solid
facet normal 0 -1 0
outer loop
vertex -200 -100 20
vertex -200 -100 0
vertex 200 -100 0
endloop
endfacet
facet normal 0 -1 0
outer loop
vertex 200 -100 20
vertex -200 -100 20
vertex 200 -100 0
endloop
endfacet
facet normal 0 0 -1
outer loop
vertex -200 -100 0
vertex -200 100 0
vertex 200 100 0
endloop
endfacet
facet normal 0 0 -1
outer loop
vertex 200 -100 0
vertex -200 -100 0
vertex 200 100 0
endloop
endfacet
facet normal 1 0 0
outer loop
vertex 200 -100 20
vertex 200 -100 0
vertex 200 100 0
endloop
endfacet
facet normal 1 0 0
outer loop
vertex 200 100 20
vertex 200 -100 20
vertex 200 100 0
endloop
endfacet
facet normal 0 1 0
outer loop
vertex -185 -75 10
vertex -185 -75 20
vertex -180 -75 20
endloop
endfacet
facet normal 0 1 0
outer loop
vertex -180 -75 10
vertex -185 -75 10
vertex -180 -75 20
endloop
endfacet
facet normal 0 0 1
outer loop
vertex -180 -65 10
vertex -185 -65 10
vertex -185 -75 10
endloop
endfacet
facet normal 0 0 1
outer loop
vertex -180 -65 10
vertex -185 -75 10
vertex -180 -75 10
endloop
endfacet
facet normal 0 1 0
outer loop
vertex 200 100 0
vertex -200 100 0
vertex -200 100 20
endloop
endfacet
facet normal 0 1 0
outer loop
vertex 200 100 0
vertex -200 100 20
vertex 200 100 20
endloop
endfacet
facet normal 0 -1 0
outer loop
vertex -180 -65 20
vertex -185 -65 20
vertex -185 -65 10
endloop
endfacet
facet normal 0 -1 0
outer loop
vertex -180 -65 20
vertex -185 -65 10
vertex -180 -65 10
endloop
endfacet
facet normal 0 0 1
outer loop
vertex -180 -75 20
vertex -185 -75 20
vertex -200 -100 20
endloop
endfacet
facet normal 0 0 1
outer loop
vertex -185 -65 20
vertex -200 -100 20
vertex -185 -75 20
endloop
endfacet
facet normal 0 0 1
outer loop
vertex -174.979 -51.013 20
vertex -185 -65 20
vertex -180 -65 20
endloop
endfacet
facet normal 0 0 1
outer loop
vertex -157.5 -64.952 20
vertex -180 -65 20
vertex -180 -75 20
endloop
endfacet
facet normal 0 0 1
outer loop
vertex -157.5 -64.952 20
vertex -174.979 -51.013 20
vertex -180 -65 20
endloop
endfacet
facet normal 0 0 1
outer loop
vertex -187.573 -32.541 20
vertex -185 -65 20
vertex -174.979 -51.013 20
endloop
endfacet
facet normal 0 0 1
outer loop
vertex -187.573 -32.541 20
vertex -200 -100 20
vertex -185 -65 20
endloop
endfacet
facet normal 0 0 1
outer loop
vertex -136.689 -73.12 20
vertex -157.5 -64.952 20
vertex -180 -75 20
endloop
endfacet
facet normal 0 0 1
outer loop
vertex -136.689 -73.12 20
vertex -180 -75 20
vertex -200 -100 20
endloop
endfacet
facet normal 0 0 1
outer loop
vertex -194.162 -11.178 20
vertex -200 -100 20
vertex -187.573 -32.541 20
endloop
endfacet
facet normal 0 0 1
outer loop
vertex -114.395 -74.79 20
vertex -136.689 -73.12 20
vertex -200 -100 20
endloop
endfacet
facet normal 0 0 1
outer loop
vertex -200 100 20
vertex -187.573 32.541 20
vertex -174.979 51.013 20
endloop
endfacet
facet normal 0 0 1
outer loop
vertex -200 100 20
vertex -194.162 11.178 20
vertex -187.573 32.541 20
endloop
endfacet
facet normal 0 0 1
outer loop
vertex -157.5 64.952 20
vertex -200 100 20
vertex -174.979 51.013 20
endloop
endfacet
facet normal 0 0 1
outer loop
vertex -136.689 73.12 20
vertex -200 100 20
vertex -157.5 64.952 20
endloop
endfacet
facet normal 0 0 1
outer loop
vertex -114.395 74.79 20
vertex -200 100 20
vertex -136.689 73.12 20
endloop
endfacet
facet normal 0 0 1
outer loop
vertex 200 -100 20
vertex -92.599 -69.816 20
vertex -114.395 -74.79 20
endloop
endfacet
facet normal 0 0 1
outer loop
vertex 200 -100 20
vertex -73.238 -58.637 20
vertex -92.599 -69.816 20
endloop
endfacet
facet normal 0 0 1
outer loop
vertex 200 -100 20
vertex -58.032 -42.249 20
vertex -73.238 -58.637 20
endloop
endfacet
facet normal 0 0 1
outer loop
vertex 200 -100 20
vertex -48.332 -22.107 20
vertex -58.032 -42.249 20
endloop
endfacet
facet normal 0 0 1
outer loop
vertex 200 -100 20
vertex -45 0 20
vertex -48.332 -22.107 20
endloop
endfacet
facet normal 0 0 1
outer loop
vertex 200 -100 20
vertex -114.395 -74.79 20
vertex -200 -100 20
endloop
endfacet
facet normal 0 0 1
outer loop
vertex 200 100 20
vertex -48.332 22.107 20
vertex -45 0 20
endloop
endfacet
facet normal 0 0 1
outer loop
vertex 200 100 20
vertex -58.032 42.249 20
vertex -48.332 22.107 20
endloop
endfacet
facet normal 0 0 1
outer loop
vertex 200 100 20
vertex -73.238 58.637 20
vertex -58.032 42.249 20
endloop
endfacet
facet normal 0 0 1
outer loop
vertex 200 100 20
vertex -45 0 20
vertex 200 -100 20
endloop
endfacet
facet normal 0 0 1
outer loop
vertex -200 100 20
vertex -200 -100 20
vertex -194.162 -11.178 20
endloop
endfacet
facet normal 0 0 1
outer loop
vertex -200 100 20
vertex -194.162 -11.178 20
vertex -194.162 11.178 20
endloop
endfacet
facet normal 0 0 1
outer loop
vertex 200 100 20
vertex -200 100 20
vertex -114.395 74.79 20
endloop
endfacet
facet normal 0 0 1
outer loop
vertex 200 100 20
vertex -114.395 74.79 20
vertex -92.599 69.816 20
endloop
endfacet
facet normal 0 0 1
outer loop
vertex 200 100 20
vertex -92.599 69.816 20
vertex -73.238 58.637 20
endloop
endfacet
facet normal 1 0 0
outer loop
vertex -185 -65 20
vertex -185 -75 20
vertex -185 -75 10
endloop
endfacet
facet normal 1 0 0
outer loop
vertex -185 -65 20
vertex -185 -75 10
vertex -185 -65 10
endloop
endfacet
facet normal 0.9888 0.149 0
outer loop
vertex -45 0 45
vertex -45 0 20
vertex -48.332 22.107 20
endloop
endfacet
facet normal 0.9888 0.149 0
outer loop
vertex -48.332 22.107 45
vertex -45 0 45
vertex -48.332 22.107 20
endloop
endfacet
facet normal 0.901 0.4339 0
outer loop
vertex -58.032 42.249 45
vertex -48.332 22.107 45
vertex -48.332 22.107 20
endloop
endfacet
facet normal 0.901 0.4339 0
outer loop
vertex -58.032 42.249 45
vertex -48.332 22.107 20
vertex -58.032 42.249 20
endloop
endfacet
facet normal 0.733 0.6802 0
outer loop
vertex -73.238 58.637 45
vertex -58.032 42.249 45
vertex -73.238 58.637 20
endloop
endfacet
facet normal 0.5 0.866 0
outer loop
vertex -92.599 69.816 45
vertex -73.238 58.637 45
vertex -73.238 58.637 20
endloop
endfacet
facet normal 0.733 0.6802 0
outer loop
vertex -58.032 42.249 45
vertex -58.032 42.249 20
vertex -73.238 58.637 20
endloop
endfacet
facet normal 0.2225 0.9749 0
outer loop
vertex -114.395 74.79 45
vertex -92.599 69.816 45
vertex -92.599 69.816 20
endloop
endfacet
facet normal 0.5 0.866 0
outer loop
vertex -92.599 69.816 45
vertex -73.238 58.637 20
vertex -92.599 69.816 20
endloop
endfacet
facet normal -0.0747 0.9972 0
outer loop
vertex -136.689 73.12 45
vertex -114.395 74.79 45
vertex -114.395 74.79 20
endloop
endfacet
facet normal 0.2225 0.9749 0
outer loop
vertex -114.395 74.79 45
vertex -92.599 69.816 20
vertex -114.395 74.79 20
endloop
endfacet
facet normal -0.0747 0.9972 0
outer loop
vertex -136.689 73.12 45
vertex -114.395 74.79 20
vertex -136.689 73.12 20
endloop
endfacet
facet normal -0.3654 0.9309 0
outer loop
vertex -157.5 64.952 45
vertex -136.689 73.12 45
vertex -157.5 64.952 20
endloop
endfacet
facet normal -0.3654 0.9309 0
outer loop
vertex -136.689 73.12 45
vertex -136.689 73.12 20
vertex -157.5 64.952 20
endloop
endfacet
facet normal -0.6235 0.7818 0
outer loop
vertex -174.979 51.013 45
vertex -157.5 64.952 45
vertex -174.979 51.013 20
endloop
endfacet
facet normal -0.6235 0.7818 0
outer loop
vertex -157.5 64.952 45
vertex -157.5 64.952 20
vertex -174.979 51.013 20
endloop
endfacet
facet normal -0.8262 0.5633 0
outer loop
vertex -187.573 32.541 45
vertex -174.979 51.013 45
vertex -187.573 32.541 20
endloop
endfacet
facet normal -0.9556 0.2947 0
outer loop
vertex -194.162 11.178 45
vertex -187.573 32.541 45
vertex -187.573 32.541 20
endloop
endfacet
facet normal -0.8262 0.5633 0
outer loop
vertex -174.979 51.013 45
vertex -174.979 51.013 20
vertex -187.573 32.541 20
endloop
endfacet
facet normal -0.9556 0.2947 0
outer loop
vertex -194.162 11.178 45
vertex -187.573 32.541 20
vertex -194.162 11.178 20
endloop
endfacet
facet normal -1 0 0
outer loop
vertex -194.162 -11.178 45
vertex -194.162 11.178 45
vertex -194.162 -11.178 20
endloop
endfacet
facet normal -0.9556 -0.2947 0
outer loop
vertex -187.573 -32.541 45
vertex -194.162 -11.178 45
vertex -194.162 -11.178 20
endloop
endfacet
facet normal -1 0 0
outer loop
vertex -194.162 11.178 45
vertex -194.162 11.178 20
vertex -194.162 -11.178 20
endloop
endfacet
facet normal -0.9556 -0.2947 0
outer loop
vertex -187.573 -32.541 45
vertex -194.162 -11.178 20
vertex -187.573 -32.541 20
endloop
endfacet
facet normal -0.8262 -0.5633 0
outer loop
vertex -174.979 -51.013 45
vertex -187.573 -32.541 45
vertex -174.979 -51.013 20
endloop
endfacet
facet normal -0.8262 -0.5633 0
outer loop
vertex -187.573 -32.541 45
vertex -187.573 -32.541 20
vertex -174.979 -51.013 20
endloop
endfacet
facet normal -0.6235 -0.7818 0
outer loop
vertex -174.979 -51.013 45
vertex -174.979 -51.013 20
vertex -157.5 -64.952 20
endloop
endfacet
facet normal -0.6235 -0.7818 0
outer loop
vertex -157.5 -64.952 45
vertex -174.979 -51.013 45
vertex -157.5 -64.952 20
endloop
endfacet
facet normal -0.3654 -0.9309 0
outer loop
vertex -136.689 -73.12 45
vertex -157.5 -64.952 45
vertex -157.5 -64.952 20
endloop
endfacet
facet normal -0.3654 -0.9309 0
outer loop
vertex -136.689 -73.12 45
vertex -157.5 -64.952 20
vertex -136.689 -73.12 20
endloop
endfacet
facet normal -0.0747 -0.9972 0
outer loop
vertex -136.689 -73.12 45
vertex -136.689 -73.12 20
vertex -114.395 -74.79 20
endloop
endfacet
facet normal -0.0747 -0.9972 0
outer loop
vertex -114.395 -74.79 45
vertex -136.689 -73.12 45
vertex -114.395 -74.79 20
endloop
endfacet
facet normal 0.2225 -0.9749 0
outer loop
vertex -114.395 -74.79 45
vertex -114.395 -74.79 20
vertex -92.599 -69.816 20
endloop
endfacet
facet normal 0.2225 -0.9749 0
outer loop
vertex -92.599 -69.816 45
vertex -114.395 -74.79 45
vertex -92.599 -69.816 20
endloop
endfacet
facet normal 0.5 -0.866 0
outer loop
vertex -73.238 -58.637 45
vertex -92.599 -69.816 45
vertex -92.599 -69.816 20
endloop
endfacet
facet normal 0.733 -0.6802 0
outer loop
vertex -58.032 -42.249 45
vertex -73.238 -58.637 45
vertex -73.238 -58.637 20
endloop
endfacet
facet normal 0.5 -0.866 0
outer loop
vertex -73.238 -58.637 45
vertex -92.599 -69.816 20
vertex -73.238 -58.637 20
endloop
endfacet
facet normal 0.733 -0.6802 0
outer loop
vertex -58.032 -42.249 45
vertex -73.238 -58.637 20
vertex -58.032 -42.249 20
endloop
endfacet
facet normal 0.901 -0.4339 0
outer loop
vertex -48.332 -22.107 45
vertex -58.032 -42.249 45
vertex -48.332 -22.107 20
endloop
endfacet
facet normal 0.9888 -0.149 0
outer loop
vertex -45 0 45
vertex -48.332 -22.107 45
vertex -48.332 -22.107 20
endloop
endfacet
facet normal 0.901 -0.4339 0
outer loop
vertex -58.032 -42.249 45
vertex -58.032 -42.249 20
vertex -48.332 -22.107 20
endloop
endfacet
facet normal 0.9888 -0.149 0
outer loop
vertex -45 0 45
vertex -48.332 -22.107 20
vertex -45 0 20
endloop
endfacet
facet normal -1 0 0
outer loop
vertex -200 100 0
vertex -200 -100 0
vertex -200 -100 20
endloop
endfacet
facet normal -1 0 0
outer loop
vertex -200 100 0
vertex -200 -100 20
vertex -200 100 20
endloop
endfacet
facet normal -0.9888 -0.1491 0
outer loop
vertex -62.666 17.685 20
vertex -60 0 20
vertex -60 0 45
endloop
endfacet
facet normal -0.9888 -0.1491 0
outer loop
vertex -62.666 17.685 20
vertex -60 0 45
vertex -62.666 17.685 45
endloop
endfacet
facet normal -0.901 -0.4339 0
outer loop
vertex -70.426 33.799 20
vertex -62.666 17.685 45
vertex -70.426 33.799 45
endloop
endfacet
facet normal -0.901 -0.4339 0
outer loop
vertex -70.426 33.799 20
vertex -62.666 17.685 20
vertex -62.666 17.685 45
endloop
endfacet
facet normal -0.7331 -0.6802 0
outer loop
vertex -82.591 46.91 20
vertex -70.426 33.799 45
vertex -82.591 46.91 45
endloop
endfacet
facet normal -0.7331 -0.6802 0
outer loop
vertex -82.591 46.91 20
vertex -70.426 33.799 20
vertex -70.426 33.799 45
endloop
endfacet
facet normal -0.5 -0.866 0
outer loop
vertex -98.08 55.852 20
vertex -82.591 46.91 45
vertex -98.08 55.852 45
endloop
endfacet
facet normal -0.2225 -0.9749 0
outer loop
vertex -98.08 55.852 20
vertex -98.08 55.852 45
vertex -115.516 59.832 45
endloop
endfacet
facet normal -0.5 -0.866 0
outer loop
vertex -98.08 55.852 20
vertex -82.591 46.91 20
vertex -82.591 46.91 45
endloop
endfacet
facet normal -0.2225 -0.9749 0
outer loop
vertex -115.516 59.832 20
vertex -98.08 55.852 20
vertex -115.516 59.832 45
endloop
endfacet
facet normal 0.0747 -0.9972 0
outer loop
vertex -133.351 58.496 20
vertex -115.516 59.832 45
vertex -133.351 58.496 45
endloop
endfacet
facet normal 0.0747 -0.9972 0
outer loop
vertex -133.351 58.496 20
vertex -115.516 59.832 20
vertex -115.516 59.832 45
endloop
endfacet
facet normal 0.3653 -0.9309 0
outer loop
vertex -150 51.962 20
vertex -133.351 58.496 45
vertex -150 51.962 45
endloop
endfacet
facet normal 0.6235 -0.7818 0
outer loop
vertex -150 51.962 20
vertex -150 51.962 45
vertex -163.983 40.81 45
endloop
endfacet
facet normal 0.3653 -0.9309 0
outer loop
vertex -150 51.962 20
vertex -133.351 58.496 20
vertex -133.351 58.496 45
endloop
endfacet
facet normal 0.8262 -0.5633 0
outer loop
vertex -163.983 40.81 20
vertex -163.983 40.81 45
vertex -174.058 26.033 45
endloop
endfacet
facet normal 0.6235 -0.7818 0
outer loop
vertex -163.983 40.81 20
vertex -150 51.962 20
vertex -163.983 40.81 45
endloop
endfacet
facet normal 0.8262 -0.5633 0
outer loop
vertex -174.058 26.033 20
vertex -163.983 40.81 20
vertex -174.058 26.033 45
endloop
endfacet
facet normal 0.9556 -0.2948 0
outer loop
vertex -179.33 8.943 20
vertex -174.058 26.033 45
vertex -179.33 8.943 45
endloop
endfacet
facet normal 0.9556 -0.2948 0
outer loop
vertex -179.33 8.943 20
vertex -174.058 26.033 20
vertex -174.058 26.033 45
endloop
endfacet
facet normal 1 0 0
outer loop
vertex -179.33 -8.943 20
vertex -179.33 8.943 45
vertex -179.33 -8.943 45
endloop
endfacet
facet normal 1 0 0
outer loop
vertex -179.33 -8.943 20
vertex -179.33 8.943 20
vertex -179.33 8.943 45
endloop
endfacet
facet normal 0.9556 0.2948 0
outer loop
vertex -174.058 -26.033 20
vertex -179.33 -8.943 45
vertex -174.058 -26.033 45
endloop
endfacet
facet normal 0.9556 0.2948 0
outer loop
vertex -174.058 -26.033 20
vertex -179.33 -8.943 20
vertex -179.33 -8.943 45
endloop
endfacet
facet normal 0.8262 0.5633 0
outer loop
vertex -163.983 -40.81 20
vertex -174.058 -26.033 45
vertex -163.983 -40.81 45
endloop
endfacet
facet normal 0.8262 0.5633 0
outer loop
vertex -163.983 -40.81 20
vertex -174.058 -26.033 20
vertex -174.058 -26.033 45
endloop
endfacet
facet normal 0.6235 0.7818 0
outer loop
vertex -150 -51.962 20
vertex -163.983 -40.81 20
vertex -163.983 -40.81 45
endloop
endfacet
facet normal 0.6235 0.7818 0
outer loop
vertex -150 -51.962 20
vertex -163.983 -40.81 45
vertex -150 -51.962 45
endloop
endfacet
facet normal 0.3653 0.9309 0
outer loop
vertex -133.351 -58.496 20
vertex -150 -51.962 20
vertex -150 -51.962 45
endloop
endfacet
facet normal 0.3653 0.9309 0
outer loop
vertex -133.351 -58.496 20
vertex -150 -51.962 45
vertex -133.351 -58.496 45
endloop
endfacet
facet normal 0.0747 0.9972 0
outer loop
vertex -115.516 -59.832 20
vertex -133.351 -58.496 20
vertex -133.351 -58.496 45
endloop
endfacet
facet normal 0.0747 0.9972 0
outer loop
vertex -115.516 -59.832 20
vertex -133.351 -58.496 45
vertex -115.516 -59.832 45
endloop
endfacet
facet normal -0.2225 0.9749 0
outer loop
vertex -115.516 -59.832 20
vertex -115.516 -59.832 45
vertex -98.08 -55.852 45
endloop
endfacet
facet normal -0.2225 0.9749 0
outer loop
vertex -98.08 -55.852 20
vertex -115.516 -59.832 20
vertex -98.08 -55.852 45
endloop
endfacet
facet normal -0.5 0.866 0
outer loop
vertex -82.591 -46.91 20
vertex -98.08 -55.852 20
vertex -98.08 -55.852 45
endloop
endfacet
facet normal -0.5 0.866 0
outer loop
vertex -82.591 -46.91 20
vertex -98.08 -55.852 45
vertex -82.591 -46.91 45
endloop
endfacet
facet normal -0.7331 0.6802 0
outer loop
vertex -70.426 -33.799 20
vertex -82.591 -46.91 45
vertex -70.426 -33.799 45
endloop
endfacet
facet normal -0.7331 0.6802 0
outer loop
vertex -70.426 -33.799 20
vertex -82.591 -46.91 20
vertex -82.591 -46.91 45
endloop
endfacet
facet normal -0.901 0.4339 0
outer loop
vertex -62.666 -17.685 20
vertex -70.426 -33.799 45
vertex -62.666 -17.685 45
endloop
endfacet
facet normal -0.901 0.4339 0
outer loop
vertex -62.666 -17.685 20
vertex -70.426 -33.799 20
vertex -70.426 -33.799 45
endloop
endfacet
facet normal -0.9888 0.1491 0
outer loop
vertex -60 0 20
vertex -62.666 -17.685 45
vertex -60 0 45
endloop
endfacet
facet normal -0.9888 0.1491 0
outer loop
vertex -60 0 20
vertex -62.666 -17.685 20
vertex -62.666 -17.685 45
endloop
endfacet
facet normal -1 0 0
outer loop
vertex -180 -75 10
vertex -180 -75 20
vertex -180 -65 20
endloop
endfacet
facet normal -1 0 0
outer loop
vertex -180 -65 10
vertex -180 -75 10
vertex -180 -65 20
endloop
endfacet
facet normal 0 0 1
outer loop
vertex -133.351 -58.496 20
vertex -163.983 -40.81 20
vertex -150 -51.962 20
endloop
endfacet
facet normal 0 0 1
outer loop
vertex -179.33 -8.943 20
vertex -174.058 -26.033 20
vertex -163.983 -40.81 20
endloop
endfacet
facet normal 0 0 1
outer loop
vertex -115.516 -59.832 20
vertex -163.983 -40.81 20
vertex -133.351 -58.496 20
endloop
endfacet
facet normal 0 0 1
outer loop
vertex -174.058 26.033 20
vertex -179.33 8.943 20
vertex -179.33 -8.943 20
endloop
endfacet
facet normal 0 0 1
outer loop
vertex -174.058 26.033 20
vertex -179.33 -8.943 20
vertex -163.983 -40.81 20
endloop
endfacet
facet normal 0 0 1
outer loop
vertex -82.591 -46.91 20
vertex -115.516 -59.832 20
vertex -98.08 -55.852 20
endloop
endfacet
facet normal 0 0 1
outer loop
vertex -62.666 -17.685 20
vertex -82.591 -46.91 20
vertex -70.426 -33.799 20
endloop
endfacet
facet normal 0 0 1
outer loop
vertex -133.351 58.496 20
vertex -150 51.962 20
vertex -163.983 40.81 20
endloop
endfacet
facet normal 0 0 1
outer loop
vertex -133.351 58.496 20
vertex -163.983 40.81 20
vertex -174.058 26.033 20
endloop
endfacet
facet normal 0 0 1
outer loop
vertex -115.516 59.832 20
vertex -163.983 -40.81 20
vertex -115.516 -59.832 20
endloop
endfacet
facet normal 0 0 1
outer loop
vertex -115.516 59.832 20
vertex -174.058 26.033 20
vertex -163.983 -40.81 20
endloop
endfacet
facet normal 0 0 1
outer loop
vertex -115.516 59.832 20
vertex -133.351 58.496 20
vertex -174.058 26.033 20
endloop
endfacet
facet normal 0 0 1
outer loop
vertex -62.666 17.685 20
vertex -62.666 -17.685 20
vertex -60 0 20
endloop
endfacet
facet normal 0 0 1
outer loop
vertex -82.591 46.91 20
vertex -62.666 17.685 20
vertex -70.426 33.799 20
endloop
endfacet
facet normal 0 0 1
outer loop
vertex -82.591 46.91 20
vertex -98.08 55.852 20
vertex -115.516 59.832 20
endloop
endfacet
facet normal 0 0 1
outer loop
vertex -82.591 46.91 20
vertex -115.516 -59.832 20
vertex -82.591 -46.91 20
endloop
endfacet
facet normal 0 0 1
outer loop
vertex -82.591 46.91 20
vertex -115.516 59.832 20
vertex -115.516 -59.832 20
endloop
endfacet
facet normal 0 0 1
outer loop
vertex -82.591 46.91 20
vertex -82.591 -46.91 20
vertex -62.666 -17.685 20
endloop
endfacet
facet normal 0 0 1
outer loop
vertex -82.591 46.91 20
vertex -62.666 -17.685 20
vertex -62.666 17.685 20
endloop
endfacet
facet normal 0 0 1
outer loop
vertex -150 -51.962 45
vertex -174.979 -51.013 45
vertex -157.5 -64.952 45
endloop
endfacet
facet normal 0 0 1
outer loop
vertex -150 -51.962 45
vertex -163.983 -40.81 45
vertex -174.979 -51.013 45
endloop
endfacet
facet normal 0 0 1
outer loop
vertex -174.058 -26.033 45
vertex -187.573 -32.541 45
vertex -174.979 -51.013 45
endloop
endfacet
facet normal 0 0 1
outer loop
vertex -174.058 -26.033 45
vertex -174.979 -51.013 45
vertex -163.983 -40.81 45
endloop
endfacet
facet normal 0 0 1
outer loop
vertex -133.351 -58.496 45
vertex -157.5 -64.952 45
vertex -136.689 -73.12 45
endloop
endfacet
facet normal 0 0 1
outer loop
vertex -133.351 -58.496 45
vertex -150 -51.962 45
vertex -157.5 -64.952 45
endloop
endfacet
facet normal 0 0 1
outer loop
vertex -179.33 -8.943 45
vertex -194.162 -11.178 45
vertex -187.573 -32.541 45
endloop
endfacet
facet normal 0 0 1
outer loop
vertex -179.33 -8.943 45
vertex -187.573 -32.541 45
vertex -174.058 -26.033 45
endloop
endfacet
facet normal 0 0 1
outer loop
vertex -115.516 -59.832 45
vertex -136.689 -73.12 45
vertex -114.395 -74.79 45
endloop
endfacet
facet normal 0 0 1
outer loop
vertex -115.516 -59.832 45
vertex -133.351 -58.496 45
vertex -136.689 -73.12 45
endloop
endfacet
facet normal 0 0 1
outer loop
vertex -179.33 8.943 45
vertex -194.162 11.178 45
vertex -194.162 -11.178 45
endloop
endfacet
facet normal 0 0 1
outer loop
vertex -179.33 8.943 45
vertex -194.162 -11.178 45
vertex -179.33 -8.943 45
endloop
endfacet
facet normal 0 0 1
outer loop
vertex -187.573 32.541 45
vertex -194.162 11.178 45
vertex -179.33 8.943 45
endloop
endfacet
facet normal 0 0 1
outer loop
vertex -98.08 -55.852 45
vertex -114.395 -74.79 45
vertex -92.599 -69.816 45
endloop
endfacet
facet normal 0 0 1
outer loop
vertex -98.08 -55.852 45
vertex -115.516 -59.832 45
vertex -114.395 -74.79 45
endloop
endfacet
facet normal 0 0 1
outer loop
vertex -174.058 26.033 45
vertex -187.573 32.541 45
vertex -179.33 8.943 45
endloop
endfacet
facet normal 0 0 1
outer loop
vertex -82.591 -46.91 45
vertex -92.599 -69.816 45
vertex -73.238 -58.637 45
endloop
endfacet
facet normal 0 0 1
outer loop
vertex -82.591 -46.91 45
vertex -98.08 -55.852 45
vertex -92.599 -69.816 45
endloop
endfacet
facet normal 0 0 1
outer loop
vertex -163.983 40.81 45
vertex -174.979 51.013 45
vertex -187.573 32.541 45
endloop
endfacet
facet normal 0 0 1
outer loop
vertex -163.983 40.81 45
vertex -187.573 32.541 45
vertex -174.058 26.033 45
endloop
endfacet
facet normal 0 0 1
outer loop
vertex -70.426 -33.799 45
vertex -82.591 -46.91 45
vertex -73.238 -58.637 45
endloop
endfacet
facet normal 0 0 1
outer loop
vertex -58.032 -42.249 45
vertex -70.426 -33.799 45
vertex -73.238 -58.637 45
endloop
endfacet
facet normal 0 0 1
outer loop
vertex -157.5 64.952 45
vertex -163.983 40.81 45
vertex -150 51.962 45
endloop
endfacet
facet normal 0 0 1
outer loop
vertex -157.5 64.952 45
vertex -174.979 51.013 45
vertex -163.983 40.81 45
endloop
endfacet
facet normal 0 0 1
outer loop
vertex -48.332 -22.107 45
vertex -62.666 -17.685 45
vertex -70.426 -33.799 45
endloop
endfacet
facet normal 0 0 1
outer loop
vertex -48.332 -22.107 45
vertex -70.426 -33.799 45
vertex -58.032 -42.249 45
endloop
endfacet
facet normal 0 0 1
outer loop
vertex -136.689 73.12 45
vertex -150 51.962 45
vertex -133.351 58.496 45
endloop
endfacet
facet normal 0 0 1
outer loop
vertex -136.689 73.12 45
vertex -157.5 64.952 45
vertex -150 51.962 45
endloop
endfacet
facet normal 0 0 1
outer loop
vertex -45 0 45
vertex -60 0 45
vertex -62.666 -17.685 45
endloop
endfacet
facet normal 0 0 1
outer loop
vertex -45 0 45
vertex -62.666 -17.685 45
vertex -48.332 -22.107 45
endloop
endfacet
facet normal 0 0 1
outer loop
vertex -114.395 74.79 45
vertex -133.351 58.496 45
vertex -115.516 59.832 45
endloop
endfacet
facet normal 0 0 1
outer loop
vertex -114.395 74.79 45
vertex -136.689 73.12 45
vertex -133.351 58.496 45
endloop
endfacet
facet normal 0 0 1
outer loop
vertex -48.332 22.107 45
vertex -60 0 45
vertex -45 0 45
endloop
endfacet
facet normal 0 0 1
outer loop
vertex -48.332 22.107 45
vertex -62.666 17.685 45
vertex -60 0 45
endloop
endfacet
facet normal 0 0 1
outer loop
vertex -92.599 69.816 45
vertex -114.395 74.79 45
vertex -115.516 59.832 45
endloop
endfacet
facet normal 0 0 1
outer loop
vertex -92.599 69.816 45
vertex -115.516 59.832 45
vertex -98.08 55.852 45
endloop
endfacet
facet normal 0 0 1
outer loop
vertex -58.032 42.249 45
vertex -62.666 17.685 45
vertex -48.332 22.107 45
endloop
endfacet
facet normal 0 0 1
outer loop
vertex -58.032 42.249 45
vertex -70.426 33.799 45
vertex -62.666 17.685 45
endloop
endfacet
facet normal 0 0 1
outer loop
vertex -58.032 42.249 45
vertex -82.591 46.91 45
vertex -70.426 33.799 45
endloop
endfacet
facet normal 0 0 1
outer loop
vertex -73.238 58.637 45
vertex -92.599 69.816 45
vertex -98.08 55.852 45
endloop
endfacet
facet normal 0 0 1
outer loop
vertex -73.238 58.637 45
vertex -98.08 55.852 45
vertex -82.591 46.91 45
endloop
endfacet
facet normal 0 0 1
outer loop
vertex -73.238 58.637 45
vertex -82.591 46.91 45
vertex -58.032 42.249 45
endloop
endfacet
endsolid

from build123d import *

# Parameters (mm, degrees)
F0_W     = 400
F0_H     = 200
F1_DEPTH = 20
F2_R     = 75
F2_R_2   = 60
F3_DEPTH = 25
F4_W     = 5
F4_H     = 10
F5_DEPTH = 10


with BuildPart() as f1:
    # F0 (on Top) → F1 (new body)
    with BuildSketch(Plane.XY):
        Rectangle(F0_W, F0_H)
    extrude(amount=F1_DEPTH)

    # F2 (on face) → F3 (join)
    with BuildSketch(Plane.XY.offset(20)):
        with Locations((-120, 0)):
            Circle(F2_R)
        with Locations((-120, 0)):
            Circle(F2_R_2, mode=Mode.SUBTRACT)
    extrude(amount=F3_DEPTH)

    # F4 (on face) → F5 (cut)
    with BuildSketch(Plane.XY.offset(20)):
        with Locations((-182.5, -70)):
            Rectangle(F4_W, F4_H)
    extrude(amount=-F5_DEPTH, mode=Mode.SUBTRACT)


solid = f1.part
